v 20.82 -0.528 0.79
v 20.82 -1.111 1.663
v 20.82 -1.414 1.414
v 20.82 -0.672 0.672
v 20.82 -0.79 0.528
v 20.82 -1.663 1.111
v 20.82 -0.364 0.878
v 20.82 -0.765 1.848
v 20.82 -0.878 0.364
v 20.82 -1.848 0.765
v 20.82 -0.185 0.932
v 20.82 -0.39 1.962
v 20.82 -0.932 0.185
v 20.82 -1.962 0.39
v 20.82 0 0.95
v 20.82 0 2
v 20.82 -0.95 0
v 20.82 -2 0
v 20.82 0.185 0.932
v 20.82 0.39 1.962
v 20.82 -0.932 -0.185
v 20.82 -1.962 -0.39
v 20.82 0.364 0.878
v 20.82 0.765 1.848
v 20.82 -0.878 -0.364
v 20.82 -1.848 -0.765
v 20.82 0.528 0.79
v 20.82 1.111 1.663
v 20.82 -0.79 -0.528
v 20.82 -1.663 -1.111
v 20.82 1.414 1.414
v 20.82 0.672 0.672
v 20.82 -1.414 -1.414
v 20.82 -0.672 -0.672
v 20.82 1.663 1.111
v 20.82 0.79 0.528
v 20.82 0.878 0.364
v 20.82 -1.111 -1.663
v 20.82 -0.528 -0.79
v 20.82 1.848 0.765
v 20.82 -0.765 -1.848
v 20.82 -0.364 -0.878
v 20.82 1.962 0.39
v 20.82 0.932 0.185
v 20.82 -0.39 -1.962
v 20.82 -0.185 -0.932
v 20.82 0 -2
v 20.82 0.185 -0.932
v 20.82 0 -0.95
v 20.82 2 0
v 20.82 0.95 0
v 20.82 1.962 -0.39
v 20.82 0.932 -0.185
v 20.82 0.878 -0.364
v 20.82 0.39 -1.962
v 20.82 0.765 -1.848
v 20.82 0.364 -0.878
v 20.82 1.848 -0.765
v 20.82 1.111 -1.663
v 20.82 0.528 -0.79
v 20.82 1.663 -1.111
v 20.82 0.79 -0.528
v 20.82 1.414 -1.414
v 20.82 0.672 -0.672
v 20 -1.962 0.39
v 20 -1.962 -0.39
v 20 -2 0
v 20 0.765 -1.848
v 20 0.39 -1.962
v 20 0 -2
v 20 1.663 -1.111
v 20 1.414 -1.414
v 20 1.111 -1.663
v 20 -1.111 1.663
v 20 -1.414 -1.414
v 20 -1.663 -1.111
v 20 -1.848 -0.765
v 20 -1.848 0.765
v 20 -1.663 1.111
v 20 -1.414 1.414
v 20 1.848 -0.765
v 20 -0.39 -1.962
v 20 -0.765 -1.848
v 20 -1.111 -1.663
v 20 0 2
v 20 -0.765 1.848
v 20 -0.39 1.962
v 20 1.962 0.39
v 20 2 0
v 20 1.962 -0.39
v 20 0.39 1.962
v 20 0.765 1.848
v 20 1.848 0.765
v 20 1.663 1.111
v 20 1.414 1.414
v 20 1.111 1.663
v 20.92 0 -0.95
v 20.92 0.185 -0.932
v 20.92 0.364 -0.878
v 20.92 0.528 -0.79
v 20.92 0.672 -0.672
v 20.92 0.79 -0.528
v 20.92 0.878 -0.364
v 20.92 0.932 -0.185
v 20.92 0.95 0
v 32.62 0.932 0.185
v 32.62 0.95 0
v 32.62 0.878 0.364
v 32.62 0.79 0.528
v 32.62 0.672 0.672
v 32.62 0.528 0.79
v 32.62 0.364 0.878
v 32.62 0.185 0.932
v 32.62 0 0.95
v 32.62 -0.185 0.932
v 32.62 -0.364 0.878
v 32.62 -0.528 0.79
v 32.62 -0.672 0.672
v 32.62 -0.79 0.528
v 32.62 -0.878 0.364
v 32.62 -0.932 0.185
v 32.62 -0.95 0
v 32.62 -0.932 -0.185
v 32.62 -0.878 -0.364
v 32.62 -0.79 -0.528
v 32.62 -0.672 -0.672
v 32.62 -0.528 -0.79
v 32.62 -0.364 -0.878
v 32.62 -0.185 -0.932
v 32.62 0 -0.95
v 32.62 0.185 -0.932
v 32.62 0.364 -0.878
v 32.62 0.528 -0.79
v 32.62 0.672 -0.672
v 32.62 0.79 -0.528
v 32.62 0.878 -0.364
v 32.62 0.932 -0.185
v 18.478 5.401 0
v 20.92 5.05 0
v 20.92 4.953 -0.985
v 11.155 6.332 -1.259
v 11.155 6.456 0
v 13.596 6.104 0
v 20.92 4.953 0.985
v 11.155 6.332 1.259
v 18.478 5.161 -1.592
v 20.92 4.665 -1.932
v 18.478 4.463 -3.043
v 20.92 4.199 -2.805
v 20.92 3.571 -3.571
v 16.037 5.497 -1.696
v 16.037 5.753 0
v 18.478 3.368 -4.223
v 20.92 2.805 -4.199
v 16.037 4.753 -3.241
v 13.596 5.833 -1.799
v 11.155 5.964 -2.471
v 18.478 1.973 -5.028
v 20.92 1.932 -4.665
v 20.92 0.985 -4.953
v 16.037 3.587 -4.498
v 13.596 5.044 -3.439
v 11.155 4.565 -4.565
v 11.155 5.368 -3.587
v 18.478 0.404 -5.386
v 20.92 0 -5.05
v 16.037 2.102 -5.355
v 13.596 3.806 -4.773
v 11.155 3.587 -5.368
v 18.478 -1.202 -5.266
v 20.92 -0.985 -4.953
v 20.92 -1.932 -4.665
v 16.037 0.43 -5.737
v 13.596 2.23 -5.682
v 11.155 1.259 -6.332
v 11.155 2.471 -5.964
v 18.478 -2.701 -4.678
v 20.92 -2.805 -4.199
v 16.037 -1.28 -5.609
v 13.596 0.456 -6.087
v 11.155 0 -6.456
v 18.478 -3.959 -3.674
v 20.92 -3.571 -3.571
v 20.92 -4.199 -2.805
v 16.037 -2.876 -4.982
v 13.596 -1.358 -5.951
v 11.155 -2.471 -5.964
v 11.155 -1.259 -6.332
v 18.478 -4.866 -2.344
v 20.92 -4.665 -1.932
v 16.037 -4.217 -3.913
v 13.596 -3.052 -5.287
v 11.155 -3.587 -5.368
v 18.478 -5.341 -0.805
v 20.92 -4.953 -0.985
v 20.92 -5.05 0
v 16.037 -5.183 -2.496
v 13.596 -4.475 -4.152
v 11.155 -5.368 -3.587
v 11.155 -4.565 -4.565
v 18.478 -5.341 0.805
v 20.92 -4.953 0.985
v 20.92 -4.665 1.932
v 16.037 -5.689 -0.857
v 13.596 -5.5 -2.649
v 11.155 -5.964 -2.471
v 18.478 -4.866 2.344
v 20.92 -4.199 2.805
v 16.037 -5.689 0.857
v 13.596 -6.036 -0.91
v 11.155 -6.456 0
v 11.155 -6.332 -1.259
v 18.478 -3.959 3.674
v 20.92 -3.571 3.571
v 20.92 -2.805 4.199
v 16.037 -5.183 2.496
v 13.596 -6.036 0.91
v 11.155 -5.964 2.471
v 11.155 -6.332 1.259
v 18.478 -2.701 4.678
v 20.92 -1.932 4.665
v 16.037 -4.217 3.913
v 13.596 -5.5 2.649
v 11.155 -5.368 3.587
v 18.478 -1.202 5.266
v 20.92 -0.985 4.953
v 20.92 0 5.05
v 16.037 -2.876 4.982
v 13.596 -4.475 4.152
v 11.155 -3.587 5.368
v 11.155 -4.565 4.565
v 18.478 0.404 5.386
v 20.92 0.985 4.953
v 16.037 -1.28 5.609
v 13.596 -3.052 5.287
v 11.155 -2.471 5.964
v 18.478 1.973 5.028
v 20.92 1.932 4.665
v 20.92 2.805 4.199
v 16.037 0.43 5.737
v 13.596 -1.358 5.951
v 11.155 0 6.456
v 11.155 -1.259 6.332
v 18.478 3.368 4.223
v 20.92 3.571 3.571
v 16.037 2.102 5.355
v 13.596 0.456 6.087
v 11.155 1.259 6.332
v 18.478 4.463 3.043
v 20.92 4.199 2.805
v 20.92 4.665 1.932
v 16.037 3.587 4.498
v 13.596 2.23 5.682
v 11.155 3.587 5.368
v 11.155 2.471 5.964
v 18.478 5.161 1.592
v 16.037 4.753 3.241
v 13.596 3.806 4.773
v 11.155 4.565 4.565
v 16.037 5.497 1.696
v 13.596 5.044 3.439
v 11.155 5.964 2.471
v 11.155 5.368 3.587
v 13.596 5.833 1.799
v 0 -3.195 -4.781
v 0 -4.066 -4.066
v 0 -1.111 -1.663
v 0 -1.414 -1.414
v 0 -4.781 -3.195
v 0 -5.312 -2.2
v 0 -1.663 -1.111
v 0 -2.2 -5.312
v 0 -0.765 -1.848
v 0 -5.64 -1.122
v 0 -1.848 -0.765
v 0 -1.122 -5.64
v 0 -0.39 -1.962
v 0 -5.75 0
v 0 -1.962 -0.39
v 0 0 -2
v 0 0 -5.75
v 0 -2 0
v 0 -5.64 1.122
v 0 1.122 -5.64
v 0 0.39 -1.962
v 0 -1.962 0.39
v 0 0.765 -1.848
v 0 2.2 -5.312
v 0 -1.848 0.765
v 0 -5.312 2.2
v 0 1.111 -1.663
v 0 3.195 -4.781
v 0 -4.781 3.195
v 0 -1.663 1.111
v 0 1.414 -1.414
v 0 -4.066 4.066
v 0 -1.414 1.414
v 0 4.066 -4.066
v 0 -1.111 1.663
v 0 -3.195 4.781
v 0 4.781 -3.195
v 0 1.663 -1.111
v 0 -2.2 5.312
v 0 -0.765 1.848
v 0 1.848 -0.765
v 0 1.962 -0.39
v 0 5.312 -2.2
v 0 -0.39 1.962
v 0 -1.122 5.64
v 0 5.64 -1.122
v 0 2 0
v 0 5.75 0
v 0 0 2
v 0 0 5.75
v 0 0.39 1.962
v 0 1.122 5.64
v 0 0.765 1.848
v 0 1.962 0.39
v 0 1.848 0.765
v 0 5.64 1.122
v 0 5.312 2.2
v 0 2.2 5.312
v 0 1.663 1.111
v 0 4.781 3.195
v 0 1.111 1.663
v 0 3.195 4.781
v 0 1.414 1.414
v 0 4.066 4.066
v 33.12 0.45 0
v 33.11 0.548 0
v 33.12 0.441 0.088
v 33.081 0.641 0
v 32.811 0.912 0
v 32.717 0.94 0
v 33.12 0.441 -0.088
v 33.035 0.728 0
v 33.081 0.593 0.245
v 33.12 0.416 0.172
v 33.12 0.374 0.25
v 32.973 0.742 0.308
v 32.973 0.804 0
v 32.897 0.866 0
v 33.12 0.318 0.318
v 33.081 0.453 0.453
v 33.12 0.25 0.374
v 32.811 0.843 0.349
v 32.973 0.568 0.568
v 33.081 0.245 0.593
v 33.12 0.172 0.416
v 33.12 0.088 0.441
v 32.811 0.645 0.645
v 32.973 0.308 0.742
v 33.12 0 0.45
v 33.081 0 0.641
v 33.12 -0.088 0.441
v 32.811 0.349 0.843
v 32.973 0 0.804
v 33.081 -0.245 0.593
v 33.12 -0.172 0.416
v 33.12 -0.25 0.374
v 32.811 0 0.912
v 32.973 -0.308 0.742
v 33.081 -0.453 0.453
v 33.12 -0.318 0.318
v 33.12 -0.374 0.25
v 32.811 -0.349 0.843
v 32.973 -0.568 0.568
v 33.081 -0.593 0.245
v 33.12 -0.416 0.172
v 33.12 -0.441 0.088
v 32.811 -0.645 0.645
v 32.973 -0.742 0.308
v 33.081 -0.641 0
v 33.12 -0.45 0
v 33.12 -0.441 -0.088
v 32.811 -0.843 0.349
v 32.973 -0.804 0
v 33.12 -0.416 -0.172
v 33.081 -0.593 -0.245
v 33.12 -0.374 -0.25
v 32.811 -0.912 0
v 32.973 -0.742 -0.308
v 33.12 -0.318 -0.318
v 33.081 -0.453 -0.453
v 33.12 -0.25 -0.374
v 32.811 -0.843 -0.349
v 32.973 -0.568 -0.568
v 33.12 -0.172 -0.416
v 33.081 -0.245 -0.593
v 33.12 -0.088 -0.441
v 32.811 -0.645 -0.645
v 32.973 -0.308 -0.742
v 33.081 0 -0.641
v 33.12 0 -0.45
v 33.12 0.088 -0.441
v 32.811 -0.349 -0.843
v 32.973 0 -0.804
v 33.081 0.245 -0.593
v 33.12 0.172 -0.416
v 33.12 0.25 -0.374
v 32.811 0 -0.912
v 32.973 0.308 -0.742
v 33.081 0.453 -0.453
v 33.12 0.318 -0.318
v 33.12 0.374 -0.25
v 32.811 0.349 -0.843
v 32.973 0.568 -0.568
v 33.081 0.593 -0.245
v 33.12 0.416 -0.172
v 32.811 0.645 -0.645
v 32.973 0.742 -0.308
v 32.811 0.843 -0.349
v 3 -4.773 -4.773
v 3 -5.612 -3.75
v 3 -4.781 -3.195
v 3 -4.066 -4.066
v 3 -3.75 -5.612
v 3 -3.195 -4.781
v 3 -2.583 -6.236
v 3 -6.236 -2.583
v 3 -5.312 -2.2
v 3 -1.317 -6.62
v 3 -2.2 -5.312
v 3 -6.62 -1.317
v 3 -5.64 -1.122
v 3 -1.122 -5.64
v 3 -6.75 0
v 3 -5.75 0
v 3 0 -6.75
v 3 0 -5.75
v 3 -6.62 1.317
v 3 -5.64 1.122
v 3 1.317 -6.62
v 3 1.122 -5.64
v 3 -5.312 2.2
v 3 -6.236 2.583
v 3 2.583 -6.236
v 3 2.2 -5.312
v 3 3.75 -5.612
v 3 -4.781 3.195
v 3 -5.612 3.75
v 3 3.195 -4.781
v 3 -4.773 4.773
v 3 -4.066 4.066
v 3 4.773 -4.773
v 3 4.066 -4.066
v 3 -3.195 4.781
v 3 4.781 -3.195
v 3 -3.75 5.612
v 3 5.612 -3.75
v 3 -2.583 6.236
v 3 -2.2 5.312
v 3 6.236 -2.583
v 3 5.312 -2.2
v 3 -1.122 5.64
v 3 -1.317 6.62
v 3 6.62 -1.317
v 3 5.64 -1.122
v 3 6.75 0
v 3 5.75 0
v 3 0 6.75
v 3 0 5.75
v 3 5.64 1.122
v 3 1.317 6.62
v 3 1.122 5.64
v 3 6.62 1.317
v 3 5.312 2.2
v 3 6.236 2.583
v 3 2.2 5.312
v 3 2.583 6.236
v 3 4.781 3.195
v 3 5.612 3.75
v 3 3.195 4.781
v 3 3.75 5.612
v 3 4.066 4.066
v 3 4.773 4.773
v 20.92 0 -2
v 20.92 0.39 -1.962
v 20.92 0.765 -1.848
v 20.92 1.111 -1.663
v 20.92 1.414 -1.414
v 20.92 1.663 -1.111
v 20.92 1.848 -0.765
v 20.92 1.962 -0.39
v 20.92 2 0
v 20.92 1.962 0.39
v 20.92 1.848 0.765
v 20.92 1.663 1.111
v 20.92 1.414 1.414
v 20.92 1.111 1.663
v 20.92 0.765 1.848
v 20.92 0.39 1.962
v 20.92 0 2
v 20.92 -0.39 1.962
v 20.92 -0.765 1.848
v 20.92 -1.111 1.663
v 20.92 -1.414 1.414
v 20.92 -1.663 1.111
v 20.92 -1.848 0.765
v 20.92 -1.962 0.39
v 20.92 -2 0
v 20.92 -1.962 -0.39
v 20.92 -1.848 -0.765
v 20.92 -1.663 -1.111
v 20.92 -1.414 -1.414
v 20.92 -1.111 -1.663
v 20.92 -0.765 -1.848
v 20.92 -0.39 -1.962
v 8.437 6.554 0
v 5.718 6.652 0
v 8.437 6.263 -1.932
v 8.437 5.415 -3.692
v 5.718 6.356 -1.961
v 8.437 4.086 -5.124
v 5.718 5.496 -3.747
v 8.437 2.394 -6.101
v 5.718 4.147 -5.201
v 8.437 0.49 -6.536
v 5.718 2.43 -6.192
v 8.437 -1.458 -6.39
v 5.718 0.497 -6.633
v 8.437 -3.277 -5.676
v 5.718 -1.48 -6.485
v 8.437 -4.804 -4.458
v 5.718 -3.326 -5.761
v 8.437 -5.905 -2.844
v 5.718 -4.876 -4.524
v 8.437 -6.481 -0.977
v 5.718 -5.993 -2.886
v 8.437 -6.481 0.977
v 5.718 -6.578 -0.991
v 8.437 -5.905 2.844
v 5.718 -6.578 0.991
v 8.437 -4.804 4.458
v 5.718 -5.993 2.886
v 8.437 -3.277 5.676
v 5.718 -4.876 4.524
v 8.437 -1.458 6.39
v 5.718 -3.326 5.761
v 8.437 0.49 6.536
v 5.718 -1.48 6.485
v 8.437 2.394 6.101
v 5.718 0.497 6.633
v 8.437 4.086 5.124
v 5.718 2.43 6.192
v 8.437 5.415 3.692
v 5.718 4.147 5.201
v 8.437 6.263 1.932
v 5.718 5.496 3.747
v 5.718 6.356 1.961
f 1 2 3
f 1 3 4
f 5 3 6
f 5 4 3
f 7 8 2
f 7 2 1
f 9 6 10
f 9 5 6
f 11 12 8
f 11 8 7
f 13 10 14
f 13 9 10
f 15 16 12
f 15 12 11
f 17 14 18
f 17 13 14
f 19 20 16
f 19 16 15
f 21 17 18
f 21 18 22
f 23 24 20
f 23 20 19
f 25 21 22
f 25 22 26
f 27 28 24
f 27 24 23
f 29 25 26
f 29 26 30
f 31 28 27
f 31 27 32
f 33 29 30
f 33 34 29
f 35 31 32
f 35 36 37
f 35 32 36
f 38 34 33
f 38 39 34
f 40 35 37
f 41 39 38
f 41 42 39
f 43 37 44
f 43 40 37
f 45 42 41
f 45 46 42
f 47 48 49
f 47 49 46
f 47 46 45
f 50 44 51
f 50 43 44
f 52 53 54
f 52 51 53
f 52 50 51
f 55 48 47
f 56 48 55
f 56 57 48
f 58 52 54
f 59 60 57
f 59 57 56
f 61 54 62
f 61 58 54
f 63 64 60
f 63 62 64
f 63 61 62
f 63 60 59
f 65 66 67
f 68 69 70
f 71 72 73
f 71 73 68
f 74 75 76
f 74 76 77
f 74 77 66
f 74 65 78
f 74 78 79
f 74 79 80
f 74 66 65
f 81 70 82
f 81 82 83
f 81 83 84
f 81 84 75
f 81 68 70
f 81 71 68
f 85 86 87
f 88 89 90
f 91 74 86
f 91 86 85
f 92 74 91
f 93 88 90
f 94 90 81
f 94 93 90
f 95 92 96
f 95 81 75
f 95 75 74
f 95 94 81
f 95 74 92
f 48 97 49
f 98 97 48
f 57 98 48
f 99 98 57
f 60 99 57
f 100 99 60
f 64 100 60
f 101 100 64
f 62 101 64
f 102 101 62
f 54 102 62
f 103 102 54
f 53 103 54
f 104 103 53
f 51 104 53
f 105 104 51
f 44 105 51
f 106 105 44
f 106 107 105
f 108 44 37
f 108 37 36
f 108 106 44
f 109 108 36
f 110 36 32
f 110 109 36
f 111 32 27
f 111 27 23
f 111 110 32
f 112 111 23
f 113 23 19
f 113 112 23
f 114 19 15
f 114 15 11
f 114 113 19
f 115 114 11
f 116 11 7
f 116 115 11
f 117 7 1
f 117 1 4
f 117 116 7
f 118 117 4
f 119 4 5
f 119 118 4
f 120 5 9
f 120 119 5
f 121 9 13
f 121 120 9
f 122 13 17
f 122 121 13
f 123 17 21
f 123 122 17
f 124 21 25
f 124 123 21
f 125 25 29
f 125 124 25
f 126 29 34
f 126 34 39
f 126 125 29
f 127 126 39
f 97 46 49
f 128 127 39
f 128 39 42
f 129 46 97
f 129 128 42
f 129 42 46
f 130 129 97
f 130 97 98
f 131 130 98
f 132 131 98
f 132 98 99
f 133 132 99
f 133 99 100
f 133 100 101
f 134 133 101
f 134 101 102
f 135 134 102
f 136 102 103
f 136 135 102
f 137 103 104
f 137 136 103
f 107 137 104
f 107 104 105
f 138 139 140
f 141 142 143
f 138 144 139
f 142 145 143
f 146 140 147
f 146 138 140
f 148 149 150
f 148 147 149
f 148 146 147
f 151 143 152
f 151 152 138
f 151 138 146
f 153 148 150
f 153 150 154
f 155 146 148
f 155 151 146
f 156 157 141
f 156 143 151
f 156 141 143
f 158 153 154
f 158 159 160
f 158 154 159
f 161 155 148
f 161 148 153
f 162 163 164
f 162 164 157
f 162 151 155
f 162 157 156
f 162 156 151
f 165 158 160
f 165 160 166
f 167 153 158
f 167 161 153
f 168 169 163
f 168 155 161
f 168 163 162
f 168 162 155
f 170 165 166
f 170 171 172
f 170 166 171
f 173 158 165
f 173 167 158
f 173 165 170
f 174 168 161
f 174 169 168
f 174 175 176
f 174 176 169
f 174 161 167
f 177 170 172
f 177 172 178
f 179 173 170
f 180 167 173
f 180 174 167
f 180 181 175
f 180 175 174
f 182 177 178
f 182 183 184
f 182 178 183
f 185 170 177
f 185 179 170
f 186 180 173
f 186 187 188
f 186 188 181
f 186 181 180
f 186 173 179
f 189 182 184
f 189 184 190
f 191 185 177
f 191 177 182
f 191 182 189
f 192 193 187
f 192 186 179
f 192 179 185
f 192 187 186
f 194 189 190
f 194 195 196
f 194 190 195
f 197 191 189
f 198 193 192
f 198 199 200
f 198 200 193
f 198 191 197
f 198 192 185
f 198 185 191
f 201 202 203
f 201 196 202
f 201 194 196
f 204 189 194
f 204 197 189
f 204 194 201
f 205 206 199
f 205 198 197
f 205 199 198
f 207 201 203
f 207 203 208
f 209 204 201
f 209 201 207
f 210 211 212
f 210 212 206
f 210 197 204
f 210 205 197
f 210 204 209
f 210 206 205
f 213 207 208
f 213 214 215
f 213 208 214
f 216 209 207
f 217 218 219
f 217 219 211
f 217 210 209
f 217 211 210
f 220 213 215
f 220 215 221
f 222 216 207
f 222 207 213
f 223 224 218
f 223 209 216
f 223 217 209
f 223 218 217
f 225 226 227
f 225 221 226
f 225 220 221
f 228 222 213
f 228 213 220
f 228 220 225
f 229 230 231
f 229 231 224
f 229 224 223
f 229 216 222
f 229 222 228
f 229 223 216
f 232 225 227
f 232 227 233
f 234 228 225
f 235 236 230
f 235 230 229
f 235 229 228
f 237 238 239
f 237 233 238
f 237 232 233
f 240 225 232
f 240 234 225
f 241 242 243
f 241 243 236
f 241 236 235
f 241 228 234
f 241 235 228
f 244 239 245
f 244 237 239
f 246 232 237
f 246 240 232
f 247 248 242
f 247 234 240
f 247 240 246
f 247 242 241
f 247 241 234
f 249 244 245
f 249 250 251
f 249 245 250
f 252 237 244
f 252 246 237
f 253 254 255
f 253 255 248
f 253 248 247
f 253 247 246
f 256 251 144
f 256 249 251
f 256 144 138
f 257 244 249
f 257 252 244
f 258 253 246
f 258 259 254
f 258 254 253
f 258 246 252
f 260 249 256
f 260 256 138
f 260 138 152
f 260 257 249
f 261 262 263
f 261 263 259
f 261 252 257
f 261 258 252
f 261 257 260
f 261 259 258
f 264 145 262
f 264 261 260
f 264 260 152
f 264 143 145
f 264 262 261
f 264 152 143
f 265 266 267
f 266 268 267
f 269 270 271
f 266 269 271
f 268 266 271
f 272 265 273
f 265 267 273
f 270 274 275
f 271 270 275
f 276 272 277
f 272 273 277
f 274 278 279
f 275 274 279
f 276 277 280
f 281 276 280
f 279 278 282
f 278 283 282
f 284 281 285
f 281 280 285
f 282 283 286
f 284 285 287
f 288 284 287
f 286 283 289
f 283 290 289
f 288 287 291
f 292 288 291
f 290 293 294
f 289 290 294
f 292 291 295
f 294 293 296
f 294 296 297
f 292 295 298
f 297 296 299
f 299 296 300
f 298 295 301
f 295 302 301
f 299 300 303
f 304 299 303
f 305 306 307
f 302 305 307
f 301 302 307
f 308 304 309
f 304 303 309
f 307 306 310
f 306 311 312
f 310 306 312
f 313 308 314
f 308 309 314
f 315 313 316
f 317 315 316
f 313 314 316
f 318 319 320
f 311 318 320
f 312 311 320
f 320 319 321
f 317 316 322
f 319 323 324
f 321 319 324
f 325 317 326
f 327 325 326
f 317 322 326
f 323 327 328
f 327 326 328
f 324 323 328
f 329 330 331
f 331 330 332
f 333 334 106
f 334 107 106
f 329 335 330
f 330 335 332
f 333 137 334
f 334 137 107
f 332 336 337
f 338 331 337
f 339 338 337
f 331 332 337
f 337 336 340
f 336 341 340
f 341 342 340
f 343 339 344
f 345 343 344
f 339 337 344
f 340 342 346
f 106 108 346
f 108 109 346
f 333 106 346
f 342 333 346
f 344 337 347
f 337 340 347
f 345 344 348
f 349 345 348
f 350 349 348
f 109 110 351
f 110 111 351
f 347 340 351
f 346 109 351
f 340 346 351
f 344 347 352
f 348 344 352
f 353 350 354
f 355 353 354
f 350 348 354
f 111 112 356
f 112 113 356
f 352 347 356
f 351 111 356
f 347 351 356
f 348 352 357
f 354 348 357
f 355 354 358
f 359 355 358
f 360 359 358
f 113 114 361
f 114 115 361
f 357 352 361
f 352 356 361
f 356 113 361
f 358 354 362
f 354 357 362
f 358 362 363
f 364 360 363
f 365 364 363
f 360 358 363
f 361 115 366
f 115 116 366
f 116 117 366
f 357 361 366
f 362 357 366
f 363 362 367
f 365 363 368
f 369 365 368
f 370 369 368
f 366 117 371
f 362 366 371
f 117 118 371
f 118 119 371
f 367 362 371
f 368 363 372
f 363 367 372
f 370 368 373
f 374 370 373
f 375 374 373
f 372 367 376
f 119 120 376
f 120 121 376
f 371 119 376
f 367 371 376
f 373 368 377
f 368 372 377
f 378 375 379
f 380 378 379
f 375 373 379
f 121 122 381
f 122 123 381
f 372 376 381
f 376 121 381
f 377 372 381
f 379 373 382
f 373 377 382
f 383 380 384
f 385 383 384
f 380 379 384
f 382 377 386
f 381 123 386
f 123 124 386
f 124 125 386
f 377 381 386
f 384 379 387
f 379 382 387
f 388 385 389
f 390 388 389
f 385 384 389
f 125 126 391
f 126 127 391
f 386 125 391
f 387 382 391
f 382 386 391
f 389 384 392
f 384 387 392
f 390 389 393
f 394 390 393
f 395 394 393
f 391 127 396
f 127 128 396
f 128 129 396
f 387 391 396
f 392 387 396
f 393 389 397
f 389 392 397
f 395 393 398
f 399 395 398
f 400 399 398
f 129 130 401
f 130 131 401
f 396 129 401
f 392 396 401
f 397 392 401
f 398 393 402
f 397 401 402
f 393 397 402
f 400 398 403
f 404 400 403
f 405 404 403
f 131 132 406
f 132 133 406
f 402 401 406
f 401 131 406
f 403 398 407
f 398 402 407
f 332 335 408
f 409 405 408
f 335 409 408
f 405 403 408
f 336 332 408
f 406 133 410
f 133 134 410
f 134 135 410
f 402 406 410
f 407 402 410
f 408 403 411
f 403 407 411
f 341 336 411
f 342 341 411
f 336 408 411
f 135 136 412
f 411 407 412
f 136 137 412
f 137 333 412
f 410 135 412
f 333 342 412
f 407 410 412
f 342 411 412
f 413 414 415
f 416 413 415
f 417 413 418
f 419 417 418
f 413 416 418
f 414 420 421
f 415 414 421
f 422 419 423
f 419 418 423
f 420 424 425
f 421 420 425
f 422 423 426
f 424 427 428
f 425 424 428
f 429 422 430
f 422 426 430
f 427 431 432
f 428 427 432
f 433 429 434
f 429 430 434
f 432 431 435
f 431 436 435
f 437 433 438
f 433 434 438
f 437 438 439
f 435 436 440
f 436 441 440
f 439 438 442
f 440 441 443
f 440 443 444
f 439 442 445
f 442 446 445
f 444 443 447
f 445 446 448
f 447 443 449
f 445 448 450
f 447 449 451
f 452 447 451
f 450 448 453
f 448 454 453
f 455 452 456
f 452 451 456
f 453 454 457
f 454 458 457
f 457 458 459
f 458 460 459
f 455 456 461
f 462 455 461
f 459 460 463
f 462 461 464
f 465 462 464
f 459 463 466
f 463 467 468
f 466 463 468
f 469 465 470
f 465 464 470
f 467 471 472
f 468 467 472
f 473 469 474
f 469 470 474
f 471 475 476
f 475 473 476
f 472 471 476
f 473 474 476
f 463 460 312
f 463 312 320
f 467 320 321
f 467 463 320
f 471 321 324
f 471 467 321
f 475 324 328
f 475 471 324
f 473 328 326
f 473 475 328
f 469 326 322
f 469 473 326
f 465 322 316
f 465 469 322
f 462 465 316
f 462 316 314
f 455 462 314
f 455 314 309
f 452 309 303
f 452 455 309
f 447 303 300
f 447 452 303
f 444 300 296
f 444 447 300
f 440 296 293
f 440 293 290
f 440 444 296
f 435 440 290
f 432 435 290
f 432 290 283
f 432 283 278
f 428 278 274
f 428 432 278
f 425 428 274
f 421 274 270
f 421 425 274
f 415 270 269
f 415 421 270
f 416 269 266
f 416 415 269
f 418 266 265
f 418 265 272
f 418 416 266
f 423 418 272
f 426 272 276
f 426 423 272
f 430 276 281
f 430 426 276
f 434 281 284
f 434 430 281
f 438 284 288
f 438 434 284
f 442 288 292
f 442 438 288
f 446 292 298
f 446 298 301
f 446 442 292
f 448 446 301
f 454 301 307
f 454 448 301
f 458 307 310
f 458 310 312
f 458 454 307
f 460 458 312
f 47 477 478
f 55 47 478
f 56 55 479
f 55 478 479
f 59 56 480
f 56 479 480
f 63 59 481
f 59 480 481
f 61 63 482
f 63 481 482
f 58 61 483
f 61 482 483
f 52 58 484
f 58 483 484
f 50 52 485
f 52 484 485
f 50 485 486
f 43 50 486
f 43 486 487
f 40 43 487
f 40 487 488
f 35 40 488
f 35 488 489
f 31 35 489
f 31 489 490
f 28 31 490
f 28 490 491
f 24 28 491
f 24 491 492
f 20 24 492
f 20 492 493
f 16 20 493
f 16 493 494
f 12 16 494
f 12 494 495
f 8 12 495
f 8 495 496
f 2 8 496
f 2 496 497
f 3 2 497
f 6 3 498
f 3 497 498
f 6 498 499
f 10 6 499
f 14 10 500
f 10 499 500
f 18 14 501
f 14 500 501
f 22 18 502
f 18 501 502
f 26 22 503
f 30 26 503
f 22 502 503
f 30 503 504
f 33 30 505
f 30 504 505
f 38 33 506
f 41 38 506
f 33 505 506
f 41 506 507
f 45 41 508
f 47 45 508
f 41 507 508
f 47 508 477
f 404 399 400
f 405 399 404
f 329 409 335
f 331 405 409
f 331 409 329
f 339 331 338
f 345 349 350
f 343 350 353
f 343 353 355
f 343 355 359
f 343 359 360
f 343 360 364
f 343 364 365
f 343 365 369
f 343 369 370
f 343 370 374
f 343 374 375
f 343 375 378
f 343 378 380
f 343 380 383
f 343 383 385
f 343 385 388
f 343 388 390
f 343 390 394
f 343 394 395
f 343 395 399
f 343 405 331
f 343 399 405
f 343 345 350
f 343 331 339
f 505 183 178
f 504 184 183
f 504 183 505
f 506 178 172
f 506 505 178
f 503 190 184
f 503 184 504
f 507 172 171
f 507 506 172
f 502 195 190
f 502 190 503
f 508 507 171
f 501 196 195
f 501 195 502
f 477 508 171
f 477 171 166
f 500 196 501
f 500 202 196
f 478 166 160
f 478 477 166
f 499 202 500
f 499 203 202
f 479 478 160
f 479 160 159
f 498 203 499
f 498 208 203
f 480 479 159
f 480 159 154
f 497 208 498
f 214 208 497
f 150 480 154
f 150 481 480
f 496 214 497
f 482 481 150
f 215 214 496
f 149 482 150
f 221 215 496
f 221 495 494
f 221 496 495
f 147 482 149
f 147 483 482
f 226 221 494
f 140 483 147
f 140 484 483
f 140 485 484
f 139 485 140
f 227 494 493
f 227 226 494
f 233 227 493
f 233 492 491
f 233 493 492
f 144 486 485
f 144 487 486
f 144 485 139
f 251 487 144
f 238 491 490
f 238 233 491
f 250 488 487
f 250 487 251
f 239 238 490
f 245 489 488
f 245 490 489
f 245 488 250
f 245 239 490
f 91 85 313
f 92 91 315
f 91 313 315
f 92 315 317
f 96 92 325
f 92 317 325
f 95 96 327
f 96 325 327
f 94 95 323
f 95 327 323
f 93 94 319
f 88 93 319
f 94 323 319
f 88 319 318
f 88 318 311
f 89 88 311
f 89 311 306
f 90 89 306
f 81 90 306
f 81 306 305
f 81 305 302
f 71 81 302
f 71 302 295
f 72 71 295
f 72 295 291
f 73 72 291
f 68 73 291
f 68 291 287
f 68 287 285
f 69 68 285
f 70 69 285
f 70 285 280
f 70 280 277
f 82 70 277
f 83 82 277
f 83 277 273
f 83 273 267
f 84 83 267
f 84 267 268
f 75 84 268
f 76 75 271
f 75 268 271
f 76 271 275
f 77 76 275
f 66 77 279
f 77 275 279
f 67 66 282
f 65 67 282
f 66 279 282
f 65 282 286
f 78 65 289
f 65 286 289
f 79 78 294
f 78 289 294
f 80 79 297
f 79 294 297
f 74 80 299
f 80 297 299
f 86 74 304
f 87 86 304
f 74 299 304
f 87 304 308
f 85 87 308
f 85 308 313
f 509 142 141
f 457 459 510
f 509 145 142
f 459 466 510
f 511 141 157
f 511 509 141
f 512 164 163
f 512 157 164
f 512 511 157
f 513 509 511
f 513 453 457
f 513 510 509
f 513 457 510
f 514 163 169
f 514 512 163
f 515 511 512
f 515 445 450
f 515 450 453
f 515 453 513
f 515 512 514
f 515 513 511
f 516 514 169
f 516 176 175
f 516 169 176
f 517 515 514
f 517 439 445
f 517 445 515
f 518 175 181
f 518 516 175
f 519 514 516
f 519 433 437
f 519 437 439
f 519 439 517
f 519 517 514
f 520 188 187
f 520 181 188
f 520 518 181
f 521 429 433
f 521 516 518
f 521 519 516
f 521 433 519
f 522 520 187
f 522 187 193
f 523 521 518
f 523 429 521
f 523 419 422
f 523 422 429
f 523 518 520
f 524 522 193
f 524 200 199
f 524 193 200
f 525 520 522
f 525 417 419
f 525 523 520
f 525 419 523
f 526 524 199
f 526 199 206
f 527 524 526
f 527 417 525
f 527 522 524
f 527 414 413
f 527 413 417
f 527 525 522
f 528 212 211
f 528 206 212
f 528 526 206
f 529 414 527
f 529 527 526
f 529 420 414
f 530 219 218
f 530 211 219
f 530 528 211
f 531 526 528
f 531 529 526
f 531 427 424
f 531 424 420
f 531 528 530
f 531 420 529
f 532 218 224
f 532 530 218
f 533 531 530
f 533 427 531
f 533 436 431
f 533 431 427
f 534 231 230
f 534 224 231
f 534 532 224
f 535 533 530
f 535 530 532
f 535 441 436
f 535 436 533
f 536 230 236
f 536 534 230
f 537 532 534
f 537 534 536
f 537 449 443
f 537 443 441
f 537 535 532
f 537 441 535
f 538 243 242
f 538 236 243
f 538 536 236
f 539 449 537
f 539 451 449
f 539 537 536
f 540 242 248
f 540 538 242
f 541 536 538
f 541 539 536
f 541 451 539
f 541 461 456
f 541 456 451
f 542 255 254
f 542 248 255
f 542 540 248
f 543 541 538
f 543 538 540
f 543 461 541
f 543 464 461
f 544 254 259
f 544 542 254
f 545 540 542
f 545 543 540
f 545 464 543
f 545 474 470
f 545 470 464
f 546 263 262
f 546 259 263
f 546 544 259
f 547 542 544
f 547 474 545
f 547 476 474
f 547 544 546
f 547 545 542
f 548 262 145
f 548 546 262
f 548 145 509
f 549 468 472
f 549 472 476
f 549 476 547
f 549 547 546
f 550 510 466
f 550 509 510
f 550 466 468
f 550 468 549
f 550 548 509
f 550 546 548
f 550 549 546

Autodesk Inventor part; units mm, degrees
ref_plane "YZ Plane" through (0, 0, 0) normal (1, 0, 0) x (0, 1, 0)
ref_plane "XZ Plane" through (0, 0, 0) normal (0, 1, 0) x (-1, 0, 0)
ref_plane "XY Plane" through (0, 0, 0) normal (0, 0, 1) x (1, 0, 0)
sketch "Sketch1" plane through (0, 0, 0) normal (0, 0, 1) x (1, 0, 0)
  line L0 (0, 0) -> (0, 5.75)
  line L1 (0, 5.75) -> (3, 5.75)
  line L2 (3, 5.75) -> (3, 6.75)
  line L3 (20.9195, 5.0497) -> (20.9195, 0.95)
  line L4 (20.9195, 0.95) -> (32.6195, 0.95)
  line L5 (33.1195, 0.45) -> (33.1195, 0)
  line L6 (33.1195, 0) -> (0, 0)
  arc A0 (33.1195, 0.45) -> (32.6195, 0.95) centre (32.6195, 0.45) ccw
  line L7 (-7.1846, 0) -> (0, 0) construction
  line L8 (3, 6.75) -> (11.155, 6.4559)
  line L9 (11.155, 6.4559) -> (20.9195, 5.0497)
  point P0 (33.1195, 0.95)
  dimension "d0" = 5.75
  dimension "d1" = 3
  dimension "d2" = 1
  dimension "d3" = 18
  dimension "d5" = 12.2
  dimension "d6" = 0.5
  dimension "d11" = 0.95
revolve "Revolution1" add sketch "Sketch1" angle 360 about axis through (-7.1846, 0, 0) along (1, 0, 0)
sketch "Sketch2" plane through (0, 0, 0) normal (-1, 0, 0) x (0, 0, 1)
  circle A0 centre (0, 0) radius 2
  dimension "d8" = 4
extrude "Extrusion1" cut sketch "Sketch2" against normal blind 20
sketch "Sketch3" plane through (20.9195, 0, 0) normal (1, 0, 0) x (0, 0, -1)
  circle A0 centre (0, 0) radius 0.45 projected
  circle A1 centre (0, 0) radius 2
  circle A2 centre (0, 0) radius 0.95 projected
  circle A3 centre (0, 0) radius 0.95
  dimension "d12" = 4
extrude "Extrusion2" cut sketch "Sketch3" against normal blind 0.1 contours A1
properties part number "CT3149-0-Banana-Connector"
